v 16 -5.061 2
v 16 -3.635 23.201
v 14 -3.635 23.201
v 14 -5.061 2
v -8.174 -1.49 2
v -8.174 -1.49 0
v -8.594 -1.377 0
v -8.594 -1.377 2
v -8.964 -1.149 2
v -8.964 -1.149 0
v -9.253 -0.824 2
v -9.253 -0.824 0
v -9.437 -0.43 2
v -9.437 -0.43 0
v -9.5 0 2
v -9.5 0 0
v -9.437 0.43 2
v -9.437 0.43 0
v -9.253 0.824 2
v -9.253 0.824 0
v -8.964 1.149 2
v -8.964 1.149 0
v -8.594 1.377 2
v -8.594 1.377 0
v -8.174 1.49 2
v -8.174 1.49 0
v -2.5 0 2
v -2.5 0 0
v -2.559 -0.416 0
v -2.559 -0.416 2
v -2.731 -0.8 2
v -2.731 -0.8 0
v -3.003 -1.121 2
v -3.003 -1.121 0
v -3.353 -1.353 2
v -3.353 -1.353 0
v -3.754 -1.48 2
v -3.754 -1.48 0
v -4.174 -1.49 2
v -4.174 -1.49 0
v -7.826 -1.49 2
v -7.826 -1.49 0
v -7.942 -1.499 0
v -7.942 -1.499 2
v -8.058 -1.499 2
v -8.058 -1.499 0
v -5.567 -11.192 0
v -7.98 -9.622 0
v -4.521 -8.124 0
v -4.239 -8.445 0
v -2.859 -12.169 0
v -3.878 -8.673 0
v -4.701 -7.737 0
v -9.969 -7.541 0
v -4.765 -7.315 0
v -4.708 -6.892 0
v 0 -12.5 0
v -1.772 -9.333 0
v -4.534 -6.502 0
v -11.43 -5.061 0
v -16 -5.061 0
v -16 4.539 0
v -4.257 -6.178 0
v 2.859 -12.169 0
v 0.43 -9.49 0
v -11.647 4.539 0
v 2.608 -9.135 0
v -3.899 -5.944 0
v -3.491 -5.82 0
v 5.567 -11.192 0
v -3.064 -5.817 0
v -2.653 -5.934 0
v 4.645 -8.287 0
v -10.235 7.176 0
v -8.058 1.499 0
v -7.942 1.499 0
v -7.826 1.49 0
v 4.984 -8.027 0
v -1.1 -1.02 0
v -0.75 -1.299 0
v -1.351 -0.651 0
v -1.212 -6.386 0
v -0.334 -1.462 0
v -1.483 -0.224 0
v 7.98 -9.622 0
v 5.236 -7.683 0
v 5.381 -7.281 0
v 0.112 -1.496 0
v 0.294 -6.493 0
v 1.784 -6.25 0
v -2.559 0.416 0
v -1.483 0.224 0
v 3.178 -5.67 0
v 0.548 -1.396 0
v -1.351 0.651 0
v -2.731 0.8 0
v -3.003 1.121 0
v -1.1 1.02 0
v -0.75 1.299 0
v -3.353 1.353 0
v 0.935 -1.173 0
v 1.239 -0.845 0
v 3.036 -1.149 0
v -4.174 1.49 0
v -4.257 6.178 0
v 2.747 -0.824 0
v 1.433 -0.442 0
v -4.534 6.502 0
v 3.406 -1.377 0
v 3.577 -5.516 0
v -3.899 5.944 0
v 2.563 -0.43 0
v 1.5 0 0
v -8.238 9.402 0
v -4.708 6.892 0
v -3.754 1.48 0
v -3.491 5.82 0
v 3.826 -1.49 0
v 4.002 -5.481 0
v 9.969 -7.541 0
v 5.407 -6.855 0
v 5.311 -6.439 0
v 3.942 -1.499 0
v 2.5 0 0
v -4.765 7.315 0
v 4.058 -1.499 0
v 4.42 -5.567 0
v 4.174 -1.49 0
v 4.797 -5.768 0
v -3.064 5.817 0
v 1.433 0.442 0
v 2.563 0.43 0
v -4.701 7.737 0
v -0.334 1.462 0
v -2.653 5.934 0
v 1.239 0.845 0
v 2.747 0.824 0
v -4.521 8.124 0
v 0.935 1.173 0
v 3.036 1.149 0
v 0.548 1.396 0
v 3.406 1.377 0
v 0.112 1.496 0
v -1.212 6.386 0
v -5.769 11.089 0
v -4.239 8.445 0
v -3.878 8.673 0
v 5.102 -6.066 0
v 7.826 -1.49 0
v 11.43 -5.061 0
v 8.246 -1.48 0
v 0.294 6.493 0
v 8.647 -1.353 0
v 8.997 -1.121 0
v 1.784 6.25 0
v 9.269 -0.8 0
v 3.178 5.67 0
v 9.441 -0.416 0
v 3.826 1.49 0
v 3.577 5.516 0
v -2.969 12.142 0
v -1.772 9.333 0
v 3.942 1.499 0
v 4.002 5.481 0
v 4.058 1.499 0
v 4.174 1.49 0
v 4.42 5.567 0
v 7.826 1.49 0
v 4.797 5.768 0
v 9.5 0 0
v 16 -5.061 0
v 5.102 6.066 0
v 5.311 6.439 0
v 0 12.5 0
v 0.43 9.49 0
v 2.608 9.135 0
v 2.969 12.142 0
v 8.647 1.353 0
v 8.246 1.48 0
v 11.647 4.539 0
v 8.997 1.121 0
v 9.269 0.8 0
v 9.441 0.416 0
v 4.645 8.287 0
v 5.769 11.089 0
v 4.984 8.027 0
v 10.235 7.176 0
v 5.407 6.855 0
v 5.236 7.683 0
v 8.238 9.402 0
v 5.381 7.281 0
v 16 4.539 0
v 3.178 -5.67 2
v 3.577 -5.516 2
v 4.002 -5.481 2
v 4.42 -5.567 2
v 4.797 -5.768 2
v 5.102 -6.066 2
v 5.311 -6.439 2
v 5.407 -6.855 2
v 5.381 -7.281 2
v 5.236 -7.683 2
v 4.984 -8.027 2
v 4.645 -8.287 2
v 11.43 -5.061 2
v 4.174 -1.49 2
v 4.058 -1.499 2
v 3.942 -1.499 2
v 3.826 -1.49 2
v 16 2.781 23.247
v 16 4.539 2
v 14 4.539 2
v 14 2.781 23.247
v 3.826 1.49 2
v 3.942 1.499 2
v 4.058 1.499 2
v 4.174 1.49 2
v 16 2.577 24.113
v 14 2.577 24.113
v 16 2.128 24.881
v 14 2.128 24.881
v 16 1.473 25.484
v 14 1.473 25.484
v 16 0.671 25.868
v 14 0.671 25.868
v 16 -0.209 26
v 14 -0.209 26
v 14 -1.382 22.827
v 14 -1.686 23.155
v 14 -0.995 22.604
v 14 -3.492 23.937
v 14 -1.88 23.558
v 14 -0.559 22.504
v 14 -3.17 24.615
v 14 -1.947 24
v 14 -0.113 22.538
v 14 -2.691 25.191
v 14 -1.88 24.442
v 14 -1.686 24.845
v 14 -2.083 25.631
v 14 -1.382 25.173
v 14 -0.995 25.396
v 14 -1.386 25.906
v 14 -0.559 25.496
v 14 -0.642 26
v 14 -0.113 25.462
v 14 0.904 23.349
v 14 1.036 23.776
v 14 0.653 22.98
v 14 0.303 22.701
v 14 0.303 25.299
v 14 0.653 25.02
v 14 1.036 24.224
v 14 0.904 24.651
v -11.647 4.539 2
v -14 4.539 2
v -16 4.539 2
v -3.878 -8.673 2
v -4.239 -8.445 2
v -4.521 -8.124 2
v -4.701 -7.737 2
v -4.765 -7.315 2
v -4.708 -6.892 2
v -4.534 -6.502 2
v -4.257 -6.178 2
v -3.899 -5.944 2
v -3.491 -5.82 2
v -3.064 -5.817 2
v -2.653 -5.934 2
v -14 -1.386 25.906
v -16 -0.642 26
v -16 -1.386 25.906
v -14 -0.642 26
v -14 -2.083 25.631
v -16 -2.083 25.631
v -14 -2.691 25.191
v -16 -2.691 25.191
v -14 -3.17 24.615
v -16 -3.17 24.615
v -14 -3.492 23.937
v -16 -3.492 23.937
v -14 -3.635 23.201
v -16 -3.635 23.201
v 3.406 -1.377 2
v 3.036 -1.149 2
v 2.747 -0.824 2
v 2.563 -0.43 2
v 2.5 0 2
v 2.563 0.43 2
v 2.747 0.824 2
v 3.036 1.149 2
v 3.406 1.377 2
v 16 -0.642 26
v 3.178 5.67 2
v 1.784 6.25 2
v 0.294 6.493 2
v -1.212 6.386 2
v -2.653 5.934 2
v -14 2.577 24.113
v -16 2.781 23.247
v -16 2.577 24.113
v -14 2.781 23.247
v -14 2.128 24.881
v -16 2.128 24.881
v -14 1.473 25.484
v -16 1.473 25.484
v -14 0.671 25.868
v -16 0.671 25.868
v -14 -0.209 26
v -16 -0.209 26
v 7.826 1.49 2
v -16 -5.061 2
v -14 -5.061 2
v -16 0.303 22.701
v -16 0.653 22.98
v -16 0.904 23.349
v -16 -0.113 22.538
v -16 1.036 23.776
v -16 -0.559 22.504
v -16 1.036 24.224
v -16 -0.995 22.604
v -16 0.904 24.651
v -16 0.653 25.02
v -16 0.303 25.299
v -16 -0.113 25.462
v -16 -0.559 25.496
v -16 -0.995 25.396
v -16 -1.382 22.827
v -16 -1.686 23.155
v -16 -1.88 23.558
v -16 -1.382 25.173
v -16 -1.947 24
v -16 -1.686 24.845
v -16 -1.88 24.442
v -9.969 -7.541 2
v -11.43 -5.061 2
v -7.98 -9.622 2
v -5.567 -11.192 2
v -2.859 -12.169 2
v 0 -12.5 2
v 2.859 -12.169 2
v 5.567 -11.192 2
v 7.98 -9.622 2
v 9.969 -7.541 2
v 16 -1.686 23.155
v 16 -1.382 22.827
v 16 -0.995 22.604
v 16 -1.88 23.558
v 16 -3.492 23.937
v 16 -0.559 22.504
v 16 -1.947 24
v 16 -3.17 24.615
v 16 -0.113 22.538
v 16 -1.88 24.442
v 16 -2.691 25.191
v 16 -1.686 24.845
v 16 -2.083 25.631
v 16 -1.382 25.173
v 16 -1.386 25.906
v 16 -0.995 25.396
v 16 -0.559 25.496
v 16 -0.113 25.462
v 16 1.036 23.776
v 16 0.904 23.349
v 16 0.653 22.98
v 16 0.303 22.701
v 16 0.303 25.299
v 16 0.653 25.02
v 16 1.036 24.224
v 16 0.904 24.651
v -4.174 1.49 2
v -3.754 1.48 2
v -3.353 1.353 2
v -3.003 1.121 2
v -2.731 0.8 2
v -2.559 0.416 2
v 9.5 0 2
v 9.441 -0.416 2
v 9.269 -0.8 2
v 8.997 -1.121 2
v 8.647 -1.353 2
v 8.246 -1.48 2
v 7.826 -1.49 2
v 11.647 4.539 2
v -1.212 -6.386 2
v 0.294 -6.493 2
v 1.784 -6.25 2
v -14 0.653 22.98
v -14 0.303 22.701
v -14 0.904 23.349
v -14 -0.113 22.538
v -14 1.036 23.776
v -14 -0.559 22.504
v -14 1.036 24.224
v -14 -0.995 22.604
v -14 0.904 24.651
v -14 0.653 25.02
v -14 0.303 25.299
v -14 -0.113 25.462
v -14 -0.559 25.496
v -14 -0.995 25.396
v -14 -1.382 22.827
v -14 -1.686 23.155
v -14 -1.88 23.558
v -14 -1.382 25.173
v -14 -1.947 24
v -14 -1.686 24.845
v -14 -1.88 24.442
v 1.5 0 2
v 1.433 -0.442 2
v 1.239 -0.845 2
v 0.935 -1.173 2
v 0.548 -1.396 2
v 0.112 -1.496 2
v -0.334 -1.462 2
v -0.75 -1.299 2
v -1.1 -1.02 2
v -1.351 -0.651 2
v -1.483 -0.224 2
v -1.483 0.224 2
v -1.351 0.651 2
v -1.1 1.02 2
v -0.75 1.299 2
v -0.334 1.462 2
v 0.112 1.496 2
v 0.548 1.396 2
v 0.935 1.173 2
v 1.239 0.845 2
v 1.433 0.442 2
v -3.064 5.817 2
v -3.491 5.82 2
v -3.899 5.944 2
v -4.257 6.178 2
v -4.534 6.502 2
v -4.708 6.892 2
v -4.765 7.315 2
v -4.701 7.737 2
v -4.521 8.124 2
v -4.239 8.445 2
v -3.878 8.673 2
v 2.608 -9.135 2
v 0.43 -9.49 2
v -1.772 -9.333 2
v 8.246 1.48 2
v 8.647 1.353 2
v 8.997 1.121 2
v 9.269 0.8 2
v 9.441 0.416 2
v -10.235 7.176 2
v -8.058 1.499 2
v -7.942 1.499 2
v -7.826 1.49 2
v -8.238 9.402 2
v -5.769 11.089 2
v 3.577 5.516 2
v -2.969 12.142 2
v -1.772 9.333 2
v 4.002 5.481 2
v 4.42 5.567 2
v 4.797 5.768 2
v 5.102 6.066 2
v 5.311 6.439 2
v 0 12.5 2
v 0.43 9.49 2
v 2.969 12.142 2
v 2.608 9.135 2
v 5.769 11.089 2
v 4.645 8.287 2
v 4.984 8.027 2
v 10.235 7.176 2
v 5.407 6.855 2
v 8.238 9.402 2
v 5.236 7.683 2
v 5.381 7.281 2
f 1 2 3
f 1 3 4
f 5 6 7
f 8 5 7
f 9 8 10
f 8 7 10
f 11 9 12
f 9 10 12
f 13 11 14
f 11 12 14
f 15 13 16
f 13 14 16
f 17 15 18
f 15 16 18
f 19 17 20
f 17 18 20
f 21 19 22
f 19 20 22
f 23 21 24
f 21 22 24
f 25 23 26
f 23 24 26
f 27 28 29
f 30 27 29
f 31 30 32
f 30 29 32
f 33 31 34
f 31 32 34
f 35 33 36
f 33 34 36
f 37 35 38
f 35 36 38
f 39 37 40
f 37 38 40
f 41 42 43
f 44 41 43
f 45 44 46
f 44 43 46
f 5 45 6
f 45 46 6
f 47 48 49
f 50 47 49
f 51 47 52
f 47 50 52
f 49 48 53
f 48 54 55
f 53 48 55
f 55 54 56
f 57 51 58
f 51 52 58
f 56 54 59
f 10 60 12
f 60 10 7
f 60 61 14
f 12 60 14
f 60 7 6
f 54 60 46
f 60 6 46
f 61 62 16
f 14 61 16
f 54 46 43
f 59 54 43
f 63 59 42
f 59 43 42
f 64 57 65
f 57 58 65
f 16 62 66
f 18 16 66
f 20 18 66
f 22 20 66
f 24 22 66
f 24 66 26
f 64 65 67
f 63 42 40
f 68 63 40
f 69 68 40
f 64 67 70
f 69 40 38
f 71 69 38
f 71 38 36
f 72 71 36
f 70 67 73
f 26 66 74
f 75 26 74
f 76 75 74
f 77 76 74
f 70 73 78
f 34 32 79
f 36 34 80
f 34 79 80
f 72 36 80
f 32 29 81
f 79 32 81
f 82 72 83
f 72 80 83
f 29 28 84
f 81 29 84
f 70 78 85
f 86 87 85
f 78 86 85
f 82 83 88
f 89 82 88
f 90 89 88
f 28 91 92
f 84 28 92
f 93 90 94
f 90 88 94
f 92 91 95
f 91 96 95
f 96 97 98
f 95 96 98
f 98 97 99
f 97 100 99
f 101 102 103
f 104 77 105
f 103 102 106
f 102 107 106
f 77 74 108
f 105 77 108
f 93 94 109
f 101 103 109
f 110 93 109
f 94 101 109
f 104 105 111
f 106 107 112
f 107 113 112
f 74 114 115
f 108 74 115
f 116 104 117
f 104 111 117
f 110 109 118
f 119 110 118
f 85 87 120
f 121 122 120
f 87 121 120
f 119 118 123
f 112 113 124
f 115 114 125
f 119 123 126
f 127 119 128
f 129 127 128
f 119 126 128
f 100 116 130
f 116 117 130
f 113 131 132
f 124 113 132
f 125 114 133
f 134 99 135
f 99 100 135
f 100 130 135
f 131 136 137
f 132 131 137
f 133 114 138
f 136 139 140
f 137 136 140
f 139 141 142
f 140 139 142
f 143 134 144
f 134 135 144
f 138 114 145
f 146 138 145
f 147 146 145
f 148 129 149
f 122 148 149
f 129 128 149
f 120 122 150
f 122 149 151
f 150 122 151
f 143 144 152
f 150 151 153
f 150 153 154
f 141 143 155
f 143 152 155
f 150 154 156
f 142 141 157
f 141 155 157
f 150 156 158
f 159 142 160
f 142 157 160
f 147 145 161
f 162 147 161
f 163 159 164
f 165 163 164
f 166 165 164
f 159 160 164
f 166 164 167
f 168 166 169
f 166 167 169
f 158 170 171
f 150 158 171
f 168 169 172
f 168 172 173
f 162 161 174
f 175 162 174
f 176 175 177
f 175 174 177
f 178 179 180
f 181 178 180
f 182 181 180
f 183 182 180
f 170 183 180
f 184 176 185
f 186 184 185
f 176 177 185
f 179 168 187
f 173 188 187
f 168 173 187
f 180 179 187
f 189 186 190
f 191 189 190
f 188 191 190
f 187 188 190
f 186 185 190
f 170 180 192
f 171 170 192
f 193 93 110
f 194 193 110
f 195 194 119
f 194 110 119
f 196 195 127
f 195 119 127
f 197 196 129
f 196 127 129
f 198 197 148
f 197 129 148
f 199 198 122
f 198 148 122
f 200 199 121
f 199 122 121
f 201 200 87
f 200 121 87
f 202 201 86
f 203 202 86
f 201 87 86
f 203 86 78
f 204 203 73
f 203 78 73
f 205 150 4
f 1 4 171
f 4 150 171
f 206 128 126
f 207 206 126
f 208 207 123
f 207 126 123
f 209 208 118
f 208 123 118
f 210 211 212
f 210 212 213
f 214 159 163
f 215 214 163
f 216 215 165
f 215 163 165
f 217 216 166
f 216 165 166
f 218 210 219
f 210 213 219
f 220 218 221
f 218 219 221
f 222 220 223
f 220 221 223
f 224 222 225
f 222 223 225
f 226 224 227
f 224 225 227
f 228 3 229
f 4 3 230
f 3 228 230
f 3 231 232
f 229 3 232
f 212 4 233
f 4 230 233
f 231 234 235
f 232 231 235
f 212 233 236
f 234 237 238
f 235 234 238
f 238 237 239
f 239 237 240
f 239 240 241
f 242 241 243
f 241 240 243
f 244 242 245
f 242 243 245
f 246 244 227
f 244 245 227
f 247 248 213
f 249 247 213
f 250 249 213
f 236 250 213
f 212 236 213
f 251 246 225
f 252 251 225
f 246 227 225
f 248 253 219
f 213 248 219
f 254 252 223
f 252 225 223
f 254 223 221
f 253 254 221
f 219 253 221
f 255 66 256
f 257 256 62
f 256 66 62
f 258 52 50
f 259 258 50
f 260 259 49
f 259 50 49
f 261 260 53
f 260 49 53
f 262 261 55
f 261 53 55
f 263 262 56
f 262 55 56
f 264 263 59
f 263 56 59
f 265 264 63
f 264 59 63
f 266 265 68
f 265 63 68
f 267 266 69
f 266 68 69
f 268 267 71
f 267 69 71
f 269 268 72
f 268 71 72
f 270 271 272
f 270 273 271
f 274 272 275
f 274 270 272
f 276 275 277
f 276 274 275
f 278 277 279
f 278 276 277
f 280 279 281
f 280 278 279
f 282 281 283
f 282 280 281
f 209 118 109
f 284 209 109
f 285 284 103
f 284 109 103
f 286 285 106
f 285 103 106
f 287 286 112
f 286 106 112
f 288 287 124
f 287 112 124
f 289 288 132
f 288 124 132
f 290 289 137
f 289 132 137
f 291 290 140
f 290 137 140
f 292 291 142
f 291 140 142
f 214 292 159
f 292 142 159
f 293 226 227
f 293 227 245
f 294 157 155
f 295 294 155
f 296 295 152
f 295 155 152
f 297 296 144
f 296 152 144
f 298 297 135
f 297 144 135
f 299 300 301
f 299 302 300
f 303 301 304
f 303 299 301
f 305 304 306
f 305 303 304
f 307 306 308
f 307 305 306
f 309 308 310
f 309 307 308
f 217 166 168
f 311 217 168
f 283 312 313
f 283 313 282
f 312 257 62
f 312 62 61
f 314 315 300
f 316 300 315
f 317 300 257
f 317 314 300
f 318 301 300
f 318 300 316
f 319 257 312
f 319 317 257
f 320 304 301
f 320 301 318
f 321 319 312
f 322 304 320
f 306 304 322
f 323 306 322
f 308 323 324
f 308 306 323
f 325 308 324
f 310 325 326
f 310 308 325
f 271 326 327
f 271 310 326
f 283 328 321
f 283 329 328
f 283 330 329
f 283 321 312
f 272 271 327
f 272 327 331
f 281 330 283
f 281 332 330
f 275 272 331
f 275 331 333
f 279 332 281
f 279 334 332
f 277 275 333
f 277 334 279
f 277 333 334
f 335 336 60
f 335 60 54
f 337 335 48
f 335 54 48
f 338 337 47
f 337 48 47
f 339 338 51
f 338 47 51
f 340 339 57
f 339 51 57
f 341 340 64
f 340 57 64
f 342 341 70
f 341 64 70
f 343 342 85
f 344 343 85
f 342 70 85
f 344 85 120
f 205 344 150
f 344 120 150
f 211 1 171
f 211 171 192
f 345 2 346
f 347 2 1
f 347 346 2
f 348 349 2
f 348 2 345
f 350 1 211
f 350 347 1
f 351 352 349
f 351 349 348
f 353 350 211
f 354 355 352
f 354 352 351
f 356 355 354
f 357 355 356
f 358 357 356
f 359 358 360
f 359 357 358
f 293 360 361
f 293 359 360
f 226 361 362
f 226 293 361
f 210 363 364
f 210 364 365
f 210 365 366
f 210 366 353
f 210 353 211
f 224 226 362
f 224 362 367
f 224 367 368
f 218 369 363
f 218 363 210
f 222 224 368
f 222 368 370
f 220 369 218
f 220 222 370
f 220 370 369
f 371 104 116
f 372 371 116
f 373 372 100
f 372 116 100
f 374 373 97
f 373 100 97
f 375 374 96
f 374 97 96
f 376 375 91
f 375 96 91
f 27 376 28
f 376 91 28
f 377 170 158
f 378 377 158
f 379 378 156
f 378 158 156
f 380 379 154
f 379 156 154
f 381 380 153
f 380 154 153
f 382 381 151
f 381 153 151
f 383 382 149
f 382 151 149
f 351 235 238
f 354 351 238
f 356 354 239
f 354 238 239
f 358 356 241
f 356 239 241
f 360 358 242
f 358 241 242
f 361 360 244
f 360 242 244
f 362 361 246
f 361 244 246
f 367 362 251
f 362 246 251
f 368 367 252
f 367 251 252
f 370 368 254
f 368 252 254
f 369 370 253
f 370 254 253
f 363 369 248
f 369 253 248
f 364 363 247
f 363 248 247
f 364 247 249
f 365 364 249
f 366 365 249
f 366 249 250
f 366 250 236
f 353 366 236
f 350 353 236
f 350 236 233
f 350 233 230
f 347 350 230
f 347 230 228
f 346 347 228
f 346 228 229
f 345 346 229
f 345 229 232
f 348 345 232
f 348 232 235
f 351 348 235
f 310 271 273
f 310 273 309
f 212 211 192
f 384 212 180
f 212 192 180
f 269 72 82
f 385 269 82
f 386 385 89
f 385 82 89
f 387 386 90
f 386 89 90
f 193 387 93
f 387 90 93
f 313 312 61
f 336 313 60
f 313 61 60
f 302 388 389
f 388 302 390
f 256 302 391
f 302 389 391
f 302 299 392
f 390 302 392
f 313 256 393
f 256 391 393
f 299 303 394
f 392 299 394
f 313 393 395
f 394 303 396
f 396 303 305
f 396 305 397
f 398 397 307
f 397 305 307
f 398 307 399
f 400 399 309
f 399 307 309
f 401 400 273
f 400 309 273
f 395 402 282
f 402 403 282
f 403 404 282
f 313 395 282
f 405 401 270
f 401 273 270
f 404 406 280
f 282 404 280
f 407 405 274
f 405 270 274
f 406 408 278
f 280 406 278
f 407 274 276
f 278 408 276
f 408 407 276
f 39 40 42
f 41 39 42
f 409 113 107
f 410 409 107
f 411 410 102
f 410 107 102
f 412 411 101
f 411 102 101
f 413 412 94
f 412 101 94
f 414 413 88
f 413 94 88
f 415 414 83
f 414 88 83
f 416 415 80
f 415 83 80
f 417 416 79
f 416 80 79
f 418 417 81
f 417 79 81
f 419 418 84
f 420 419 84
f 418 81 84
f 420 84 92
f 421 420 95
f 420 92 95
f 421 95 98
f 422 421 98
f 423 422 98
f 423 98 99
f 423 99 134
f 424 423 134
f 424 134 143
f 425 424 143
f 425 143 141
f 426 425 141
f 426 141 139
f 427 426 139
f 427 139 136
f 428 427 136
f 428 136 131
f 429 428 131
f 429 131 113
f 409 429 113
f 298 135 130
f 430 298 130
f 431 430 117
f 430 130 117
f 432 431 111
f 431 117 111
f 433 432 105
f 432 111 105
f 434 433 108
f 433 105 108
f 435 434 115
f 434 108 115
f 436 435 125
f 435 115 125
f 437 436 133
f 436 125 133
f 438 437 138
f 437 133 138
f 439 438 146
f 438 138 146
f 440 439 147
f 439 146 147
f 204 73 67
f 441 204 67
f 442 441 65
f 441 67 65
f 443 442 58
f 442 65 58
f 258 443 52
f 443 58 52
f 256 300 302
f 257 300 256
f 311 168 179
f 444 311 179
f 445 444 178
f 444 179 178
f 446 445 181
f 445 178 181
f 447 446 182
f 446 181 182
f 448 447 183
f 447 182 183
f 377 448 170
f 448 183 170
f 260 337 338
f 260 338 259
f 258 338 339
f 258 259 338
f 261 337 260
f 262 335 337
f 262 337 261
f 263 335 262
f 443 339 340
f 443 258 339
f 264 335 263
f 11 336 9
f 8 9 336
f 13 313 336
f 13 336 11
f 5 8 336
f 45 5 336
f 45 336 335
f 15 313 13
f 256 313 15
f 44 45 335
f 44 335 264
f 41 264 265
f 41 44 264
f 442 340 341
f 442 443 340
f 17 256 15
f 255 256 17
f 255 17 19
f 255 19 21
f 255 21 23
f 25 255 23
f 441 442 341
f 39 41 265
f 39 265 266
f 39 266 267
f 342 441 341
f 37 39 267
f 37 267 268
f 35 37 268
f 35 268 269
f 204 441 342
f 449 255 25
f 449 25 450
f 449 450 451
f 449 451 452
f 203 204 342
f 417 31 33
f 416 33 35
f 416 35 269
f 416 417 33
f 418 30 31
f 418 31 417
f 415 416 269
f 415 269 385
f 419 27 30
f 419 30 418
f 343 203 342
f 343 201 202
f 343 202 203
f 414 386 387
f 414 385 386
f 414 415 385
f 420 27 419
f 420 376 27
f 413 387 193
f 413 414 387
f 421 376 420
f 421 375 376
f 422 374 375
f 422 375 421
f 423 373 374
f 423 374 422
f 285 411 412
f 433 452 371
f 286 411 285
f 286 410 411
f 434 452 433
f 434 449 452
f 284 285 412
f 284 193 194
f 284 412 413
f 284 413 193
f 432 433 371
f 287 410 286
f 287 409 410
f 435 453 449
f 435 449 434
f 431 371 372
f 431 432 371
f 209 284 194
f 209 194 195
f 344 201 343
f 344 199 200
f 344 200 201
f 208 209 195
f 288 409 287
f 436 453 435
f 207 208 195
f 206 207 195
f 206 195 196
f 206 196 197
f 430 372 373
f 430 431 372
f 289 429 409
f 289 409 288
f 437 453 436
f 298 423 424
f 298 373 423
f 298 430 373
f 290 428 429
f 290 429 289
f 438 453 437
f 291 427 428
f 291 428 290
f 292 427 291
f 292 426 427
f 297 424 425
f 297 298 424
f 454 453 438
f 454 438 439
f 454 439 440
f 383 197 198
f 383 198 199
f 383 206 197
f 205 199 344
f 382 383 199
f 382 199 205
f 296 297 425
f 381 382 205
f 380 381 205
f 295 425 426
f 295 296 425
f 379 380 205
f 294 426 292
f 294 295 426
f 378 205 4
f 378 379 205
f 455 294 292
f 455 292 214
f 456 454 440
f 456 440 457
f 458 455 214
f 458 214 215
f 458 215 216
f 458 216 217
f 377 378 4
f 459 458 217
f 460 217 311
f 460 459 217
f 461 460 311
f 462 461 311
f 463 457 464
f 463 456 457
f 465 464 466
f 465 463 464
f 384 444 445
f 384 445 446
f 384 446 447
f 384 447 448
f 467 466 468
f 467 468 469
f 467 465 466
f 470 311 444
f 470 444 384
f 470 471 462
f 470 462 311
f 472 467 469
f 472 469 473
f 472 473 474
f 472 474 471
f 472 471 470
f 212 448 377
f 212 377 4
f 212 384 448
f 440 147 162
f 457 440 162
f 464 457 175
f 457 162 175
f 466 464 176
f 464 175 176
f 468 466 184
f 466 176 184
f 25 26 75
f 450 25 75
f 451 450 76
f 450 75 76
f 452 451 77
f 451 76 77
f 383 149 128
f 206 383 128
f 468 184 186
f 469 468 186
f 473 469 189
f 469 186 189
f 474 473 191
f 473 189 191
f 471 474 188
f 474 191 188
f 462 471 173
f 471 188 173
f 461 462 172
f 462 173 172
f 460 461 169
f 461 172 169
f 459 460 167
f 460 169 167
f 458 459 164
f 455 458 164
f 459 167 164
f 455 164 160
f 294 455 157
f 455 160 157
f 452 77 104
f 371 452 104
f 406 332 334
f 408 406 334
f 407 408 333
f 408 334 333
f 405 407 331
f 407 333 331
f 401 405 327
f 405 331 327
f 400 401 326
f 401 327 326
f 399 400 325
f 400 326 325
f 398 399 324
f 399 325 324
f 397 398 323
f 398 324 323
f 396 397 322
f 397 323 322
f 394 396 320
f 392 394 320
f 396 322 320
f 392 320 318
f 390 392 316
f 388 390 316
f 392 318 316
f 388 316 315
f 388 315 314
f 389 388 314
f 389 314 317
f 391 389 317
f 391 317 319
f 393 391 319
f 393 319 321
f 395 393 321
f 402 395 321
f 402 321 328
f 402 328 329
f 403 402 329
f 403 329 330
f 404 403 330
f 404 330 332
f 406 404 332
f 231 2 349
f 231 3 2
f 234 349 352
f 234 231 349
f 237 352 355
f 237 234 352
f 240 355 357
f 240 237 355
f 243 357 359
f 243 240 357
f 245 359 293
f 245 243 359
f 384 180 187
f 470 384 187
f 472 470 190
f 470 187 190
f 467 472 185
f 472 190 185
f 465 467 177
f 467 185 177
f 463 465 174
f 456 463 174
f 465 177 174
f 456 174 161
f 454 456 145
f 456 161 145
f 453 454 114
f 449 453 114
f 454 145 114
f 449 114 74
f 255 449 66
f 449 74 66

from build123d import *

# Parameters (mm, degrees)
F0_R      = 12.5
F2_DEPTH  = 2
F3_DEPTH  = 2
F6_DEPTH  = 2
F7_DEPTH  = 2
F9_R      = 3
F8_R      = 1.5
F10_DEPTH = 50
F13_DEPTH = 25
F14_R     = 1.5
F15_DEPTH = 4


with BuildPart() as f2:
    # F0 (on Top) → F2 (new body)
    with BuildSketch(Plane.XY):
        Circle(F0_R)
    extrude(amount=F2_DEPTH)

    # F1 (on Top) → F3 (join)
    with BuildSketch(Plane.XY):
        Polygon((-16, 4.5392797553), (-16, 0), (-16, -5.0607202447), (16, -5.0607202447), (16, 4.5392797553), align=None)
    extrude(amount=F3_DEPTH)

    # F4 (on face) → F6 (join)
    with BuildSketch(Plane.YZ.offset(16)):
        Polygon((-3.447040217, 26), (-5.0607202447, 2), (4.5392797553, 2), (2.552959783, 26), align=None)
    extrude(amount=-F6_DEPTH)

    # F5 (on face) → F7 (join)
    with BuildSketch(Plane(origin=(-16, 0, 0), x_dir=(0, -1, 0), z_dir=(-1, 0, 0))):
        Polygon((-2.552959783, 26), (-4.5392797553, 2), (5.0607202447, 2), (3.447040217, 26), align=None)
    extrude(amount=-F7_DEPTH)

    # F9
    f9_edges = [f2.edges().sort_by_distance(p)[0] for p in [
        (-15, 2.55296, 26),
        (-15, -3.44704, 26),
        (15, 2.55296, 26),
        (15, -3.44704, 26),
    ]]
    fillet(f9_edges, radius=F9_R)

    # F8 (on face) → F10 (cut)
    with BuildSketch(Plane(origin=(-16, 0, 0), x_dir=(0, -1, 0), z_dir=(-1, 0, 0))):
        with Locations((0.447040217, 24)):
            Circle(F8_R)
    extrude(amount=-F10_DEPTH, mode=Mode.SUBTRACT)

    # F12 (on face) → F13 (cut)
    with BuildSketch(Plane(origin=(0, 0, 0), x_dir=(1, 0, 0), z_dir=(0, 0, -1))):
        with BuildLine():
            ThreePointArc((-3.8775368017, 8.6726413711), (-4.6346585758, 6.6910342912), (-2.6530514959, 5.933912517))
            ThreePointArc((-2.6530514959, 5.933912517), (0.2938735431, 6.4933533972), (3.1782167937, 5.670003352))
            ThreePointArc((3.1782167937, 5.670003352), (5.2201137504, 6.2450310193), (4.6450860831, 8.286927976))
            ThreePointArc((4.6450860831, 8.286927976), (0.4295074861, 9.4902857343), (-3.8775368017, 8.6726413711))
        make_face()
        with BuildLine():
            ThreePointArc((-2.6530514959, -5.933912517), (-4.6346585758, -6.6910342912), (-3.8775368017, -8.6726413711))
            ThreePointArc((-3.8775368017, -8.6726413711), (0.4295074861, -9.4902857343), (4.6450860831, -8.286927976))
            ThreePointArc((4.6450860831, -8.286927976), (5.2201137504, -6.2450310193), (3.1782167937, -5.670003352))
            ThreePointArc((3.1782167937, -5.670003352), (0.2938735431, -6.4933533972), (-2.6530514959, -5.933912517))
        make_face()
    extrude(amount=-F13_DEPTH, mode=Mode.SUBTRACT)

    # F14 (on face) → F15 (cut)
    with BuildSketch(Plane(origin=(0, 0, 0), x_dir=(1, 0, 0), z_dir=(0, 0, -1))):
        with BuildLine():
            ThreePointArc((-4.1741742618, -1.4898534581), (-3.0028193225, -1.1205492833), (-2.5, 0))
            ThreePointArc((-2.5, 0), (-3.0028193225, 1.1205492833), (-4.1741742618, 1.4898534581))
            Line((-4.1741742618, 1.4898534581), (-4.1741742618, -1.4898534581))
        make_face()
        with BuildLine():
            Line((-4.1741742618, -1.4898534581), (-4.1741742618, 1.4898534581))
            ThreePointArc((-4.1741742618, 1.4898534581), (-5.5, 0), (-4.1741742618, -1.4898534581))
        make_face()
        with BuildLine():
            ThreePointArc((-4.1741742618, -1.4898534581), (-5.5, 0), (-4.1741742618, 1.4898534581))
            Line((-4.1741742618, 1.4898534581), (-7.8258257382, 1.4898534581))
            ThreePointArc((-7.8258257382, 1.4898534581), (-6.8794507167, 0.9971806775), (-6.5, 0))
            ThreePointArc((-6.5, 0), (-6.8794507167, -0.9971806775), (-7.8258257382, -1.4898534581))
            Line((-7.8258257382, -1.4898534581), (-4.1741742618, -1.4898534581))
        make_face()
        with BuildLine():
            Line((-8.1741742618, 1.4898534581), (-7.8258257382, 1.4898534581))
            ThreePointArc((-7.8258257382, 1.4898534581), (-8, 1.5), (-8.1741742618, 1.4898534581))
        make_face()
        with BuildLine():
            ThreePointArc((-6.5, 0), (-6.8794507167, 0.9971806775), (-7.8258257382, 1.4898534581))
            Line((-7.8258257382, 1.4898534581), (-8.1741742618, 1.4898534581))
            Line((-8.1741742618, 1.4898534581), (-8.1741742618, -1.4898534581))
            Line((-8.1741742618, -1.4898534581), (-7.8258257382, -1.4898534581))
            ThreePointArc((-7.8258257382, -1.4898534581), (-6.8794507167, -0.9971806775), (-6.5, 0))
        make_face()
        with BuildLine():
            ThreePointArc((-8.1741742618, -1.4898534581), (-8, -1.5), (-7.8258257382, -1.4898534581))
            Line((-7.8258257382, -1.4898534581), (-8.1741742618, -1.4898534581))
        make_face()
        with BuildLine():
            Line((-8.1741742618, -1.4898534581), (-8.1741742618, 1.4898534581))
            ThreePointArc((-8.1741742618, 1.4898534581), (-9.5, 0), (-8.1741742618, -1.4898534581))
        make_face()
        with BuildLine():
            ThreePointArc((4.1741742618, 1.4898534581), (4, 1.5), (3.8258257382, 1.4898534581))
            Line((3.8258257382, 1.4898534581), (4.1741742618, 1.4898534581))
        make_face()
        with BuildLine():
            Line((3.8258257382, -1.4898534581), (3.8258257382, 1.4898534581))
            ThreePointArc((3.8258257382, 1.4898534581), (2.5, 0), (3.8258257382, -1.4898534581))
        make_face()
        with BuildLine():
            Line((4.1741742618, 1.4898534581), (3.8258257382, 1.4898534581))
            Line((3.8258257382, 1.4898534581), (3.8258257382, -1.4898534581))
            Line((3.8258257382, -1.4898534581), (4.1741742618, -1.4898534581))
            ThreePointArc((4.1741742618, -1.4898534581), (5.1205492833, -0.9971806775), (5.5, 0))
            ThreePointArc((5.5, 0), (5.1205492833, 0.9971806775), (4.1741742618, 1.4898534581))
        make_face()
        with BuildLine():
            Line((7.8258257382, 1.4898534581), (4.1741742618, 1.4898534581))
            ThreePointArc((4.1741742618, 1.4898534581), (5.1205492833, 0.9971806775), (5.5, 0))
            ThreePointArc((5.5, 0), (5.1205492833, -0.9971806775), (4.1741742618, -1.4898534581))
            Line((4.1741742618, -1.4898534581), (7.8258257382, -1.4898534581))
            ThreePointArc((7.8258257382, -1.4898534581), (6.5, 0), (7.8258257382, 1.4898534581))
        make_face()
        with BuildLine():
            Line((4.1741742618, -1.4898534581), (3.8258257382, -1.4898534581))
            ThreePointArc((3.8258257382, -1.4898534581), (4, -1.5), (4.1741742618, -1.4898534581))
        make_face()
        with BuildLine():
            Line((7.8258257382, -1.4898534581), (7.8258257382, 1.4898534581))
            ThreePointArc((7.8258257382, 1.4898534581), (6.5, 0), (7.8258257382, -1.4898534581))
        make_face()
        with BuildLine():
            ThreePointArc((9.5, 0), (8.9971806775, 1.1205492833), (7.8258257382, 1.4898534581))
            Line((7.8258257382, 1.4898534581), (7.8258257382, -1.4898534581))
            ThreePointArc((7.8258257382, -1.4898534581), (8.9971806775, -1.1205492833), (9.5, 0))
        make_face()
        Circle(F14_R)
    extrude(amount=-F15_DEPTH, mode=Mode.SUBTRACT)


solid = f2.part
